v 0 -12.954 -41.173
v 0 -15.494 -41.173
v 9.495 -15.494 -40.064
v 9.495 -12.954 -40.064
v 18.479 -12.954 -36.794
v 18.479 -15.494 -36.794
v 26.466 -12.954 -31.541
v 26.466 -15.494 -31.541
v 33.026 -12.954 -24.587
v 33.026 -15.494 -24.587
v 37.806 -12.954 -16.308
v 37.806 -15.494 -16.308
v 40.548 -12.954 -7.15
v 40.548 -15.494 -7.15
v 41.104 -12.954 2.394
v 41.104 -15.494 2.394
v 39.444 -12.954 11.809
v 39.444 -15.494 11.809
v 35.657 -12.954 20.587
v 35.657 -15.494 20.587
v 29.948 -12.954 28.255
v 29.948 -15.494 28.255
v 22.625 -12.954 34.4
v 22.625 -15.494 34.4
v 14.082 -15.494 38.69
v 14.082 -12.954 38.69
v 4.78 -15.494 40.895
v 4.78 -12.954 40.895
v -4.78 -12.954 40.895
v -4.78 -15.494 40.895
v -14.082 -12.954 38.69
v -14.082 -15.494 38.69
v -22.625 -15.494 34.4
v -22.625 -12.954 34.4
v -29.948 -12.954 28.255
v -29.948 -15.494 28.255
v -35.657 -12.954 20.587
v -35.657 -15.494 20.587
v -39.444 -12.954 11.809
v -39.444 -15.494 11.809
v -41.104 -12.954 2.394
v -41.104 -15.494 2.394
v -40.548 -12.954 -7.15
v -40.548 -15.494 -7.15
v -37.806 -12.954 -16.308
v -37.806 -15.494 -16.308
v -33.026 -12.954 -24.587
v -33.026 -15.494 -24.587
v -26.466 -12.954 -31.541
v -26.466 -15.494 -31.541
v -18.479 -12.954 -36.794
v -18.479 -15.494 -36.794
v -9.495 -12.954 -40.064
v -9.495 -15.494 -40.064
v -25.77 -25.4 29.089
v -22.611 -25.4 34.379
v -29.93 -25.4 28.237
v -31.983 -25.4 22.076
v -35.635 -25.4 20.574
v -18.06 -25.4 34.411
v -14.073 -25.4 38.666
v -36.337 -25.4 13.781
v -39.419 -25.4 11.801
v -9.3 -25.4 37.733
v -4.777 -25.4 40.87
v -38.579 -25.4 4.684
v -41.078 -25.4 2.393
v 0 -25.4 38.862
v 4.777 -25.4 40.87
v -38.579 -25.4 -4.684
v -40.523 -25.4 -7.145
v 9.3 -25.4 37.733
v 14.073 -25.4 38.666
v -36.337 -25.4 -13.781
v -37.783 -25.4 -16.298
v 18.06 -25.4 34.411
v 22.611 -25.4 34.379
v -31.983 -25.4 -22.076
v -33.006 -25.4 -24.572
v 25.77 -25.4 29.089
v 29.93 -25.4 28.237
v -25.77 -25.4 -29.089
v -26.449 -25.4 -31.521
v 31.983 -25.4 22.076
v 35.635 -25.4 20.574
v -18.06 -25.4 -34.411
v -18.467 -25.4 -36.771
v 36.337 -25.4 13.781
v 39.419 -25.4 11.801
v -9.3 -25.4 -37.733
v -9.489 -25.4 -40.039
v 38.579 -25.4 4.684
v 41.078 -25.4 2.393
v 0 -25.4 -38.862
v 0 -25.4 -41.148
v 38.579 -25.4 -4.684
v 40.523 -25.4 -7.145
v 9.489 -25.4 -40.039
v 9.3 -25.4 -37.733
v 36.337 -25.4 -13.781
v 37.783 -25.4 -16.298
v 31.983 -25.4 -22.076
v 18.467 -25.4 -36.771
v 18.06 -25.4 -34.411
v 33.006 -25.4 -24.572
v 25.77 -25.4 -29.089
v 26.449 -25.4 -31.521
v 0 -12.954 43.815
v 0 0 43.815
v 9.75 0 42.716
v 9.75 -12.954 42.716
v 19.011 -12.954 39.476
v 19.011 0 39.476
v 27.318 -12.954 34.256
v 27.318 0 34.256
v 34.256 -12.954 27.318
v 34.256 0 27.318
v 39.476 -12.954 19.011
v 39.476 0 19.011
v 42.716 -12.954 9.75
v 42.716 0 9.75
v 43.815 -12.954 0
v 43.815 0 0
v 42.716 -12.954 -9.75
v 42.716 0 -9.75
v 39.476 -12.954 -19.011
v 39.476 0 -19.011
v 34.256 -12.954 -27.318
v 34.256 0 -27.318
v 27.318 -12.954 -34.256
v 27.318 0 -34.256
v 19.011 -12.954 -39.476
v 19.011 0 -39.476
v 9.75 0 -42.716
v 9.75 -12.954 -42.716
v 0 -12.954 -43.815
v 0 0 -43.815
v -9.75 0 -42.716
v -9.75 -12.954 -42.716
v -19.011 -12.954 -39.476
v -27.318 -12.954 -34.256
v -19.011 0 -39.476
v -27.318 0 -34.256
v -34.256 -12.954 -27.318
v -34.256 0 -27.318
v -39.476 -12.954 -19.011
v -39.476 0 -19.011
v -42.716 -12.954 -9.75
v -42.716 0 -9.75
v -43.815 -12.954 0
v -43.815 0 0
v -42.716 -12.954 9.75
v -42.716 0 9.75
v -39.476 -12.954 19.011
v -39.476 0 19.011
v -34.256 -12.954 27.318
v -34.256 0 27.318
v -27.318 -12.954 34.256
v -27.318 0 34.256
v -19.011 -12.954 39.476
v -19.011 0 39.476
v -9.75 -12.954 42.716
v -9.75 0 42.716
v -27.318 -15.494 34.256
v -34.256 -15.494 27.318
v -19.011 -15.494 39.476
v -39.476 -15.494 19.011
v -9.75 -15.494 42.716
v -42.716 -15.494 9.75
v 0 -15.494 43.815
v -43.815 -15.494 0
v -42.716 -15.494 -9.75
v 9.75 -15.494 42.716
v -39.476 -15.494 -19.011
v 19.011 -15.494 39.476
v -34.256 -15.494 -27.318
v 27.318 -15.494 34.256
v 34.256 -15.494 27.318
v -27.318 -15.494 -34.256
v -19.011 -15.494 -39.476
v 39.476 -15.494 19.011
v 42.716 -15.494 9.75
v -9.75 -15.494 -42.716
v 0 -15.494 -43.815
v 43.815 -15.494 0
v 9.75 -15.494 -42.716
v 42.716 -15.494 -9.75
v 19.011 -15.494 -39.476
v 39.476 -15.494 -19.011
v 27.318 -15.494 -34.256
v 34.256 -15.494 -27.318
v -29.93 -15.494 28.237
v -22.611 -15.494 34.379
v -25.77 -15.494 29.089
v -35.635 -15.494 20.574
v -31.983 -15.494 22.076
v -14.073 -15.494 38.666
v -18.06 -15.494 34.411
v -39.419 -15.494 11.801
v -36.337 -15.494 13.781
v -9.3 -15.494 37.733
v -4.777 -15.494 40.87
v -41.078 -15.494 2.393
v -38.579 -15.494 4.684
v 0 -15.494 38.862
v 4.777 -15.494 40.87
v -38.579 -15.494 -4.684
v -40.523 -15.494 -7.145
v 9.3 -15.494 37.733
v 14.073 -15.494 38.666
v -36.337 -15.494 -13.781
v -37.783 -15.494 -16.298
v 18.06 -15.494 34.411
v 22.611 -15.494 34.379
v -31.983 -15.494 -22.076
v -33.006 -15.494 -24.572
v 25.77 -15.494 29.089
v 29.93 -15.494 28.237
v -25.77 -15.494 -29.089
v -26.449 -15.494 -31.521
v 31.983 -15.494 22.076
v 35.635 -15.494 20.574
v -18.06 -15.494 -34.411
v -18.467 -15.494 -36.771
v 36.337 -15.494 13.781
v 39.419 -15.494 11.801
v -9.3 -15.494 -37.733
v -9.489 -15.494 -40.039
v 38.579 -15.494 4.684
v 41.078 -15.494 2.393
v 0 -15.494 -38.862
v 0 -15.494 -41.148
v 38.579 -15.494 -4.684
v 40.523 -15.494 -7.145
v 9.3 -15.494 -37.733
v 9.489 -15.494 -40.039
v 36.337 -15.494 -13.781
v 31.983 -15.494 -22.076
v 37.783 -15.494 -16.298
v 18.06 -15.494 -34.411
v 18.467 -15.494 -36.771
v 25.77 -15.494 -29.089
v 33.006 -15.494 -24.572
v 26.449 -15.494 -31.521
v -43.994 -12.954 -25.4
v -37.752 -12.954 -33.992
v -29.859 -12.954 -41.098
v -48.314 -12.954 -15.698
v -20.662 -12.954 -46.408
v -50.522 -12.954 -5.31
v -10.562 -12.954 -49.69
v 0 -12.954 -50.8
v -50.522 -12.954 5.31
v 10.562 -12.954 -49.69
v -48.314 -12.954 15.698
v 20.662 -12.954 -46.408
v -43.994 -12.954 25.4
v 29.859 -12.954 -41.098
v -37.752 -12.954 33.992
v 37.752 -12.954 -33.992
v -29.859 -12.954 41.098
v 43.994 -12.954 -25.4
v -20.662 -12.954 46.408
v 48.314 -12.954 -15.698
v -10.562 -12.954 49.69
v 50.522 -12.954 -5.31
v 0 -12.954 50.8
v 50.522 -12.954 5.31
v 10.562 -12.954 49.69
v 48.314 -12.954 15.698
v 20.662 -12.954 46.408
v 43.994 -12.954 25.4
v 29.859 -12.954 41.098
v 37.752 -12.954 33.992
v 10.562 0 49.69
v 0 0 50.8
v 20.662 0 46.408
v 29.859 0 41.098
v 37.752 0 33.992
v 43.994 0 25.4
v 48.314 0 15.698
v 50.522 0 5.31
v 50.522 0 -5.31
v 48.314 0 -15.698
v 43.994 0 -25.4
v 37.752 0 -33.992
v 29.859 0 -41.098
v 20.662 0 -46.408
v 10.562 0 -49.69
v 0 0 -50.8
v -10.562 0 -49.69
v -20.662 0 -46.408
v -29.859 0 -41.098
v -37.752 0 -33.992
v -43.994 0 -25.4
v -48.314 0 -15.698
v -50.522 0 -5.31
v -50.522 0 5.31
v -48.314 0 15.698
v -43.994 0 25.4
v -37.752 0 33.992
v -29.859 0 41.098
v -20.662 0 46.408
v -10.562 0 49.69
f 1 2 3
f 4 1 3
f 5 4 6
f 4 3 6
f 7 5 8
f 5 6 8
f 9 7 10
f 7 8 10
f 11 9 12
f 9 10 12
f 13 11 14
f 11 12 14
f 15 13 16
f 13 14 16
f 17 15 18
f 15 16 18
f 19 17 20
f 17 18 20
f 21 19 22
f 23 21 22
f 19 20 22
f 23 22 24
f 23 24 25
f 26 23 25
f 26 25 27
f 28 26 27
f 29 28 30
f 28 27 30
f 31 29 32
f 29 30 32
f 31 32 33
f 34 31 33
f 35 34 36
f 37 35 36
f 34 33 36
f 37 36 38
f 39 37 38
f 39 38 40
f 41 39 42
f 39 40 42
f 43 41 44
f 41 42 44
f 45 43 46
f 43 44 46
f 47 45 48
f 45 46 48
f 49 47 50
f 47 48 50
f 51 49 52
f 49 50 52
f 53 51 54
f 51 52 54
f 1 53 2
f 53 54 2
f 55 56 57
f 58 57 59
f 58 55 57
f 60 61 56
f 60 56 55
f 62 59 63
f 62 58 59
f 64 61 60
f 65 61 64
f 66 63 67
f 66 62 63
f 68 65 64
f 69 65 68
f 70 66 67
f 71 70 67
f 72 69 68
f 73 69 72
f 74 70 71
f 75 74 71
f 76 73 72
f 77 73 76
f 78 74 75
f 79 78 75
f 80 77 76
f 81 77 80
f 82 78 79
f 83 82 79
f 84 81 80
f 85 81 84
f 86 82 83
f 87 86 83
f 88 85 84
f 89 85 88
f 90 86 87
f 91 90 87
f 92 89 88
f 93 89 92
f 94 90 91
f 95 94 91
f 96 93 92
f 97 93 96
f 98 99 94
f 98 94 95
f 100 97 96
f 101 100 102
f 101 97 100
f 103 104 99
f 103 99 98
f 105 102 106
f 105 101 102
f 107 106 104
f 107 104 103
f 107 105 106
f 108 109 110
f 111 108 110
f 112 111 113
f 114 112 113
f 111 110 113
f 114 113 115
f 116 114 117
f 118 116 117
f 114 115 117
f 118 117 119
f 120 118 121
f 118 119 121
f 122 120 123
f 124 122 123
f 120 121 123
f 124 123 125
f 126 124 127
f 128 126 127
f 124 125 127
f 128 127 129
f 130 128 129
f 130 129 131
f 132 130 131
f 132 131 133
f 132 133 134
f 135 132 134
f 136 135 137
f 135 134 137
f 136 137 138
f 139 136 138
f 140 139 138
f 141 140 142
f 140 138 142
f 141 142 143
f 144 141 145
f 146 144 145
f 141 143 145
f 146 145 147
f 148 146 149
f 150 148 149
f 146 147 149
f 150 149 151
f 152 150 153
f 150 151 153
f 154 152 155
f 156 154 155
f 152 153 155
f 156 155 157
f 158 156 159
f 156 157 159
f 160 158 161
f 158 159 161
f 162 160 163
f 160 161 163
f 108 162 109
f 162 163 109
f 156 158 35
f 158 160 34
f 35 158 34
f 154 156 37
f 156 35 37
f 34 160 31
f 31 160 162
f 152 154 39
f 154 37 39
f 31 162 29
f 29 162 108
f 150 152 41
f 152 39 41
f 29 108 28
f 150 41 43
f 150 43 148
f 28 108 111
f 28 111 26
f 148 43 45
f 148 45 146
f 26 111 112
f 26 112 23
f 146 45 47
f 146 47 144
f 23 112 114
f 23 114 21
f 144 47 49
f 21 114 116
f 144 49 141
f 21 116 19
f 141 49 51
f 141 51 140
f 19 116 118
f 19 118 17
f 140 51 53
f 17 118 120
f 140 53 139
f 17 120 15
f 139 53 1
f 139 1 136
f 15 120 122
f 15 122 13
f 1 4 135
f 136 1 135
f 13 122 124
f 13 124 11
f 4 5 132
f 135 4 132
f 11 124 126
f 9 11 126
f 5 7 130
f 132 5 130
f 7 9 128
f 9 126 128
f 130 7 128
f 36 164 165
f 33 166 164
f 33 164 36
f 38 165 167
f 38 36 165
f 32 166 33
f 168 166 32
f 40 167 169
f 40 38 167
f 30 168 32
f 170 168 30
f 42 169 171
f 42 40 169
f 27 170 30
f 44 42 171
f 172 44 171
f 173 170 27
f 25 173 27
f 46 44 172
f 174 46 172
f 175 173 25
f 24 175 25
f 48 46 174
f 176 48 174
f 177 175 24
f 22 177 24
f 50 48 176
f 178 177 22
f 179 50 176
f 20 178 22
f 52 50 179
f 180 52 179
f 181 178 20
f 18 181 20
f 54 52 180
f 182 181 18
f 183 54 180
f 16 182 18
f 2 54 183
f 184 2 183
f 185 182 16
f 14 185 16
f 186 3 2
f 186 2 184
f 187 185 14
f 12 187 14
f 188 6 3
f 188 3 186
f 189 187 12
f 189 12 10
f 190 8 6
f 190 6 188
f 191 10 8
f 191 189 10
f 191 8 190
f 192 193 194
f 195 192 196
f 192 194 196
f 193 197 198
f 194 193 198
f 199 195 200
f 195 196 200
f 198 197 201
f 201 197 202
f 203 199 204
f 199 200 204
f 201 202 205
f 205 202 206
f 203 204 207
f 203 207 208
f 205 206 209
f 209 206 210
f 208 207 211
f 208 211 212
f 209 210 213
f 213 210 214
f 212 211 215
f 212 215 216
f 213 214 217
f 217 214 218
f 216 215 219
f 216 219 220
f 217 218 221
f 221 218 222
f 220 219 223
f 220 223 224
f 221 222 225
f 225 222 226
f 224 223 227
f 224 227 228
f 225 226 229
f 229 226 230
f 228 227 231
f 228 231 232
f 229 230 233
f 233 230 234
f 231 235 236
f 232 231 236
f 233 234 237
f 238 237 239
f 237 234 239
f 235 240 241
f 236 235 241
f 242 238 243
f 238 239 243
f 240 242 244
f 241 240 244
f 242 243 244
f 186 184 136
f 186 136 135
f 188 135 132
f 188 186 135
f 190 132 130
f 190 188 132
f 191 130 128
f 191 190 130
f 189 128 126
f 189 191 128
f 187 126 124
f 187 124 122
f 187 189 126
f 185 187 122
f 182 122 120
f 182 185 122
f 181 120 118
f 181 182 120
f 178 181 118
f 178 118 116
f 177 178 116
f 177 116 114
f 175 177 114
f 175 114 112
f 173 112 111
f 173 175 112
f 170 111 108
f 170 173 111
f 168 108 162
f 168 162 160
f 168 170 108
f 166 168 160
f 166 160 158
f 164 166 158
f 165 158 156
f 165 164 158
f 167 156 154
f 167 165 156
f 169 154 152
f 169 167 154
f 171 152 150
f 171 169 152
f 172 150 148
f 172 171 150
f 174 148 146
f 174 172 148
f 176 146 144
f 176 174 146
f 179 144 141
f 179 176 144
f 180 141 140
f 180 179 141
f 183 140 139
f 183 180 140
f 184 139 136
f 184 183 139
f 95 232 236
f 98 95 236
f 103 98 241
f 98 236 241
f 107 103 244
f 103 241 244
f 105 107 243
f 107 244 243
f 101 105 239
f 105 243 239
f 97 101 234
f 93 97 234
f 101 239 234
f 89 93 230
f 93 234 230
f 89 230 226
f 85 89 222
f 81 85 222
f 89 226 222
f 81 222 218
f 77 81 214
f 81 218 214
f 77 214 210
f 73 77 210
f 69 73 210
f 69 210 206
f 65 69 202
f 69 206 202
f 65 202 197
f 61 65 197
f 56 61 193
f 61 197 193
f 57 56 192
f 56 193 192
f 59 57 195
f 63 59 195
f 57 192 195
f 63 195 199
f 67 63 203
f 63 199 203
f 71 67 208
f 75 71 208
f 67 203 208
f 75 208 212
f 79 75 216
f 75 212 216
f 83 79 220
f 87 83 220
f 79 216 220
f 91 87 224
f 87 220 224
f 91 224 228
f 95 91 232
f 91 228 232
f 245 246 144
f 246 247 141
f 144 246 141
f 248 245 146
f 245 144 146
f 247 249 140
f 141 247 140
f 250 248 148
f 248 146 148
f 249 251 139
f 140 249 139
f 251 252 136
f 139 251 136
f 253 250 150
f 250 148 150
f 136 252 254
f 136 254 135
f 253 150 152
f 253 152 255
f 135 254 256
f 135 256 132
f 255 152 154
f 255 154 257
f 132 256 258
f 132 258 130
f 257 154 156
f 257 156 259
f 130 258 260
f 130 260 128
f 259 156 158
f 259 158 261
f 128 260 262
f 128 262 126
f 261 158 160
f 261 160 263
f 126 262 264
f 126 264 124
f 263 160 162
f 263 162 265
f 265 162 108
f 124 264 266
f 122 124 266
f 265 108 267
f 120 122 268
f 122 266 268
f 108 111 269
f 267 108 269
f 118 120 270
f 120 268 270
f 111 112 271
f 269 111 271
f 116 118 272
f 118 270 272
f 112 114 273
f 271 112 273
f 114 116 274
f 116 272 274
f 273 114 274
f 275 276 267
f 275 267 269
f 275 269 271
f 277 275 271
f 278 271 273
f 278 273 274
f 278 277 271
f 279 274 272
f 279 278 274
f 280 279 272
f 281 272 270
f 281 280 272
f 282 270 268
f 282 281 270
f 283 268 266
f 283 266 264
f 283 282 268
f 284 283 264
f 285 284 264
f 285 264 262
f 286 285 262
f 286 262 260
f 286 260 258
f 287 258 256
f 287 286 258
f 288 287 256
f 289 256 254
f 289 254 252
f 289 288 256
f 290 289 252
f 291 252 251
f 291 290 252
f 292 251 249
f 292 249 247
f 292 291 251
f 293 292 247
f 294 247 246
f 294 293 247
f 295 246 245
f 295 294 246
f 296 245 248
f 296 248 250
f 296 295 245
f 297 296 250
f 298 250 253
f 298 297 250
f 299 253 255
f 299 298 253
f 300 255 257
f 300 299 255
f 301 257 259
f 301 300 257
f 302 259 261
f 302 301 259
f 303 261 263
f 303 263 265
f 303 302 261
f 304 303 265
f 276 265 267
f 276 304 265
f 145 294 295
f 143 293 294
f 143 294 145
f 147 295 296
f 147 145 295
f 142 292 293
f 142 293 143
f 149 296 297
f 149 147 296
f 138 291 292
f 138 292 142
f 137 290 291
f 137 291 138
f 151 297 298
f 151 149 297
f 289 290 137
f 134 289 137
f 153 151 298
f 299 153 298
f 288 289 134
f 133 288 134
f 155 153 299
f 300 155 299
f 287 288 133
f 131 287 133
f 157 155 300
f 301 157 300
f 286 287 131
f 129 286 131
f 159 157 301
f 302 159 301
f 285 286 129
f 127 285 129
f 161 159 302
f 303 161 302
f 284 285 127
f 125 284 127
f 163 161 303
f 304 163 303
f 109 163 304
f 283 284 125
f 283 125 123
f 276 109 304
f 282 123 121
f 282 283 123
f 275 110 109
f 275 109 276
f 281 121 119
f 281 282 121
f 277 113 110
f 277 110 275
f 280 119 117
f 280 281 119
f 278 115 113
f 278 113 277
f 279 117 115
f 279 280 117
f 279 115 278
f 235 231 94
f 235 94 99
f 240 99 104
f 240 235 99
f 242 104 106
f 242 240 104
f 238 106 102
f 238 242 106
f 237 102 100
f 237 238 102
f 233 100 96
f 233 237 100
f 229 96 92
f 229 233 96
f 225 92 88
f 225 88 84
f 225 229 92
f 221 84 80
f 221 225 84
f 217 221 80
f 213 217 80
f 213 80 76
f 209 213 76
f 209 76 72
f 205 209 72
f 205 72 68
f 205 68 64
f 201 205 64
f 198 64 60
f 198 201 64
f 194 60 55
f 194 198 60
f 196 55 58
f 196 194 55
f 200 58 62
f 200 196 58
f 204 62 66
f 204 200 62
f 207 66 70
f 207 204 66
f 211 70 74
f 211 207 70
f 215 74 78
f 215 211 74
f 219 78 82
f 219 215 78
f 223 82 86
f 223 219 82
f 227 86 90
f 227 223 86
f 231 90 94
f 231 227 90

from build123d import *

# Parameters (mm, degrees)
SKETCH1_R                = 50.8
SKETCH1_R_2              = 43.815
BOSS_EXTRUDE1_DEPTH      = 12.954
SKETCH2_R                = 43.815
SKETCH2_R_2              = 41.1734
BOSS_EXTRUDE2_DEPTH      = 2.54
BOSS_EXTRUDE3_DEPTH      = 7.366
BOSS_EXTRUDE3_DEPTH_BACK = 2.54
SKETCH3_R                = 41.148
SKETCH3_R_2              = 38.862


with BuildPart() as part:
    # Sketch1 → Boss-Extrude1 (new body)
    with BuildSketch(Plane(origin=(0, 0, 0), x_dir=(1, 0, 0), z_dir=(0, 1, 0))):
        with Locations(Location((0, 0, 0), (0, 0, 270))):
            Circle(SKETCH1_R)
        with Locations(Location((0, 0, 0), (0, 0, 270))):
            Circle(SKETCH1_R_2, mode=Mode.SUBTRACT)
    extrude(amount=-BOSS_EXTRUDE1_DEPTH)


with BuildPart() as body_2:
    # Sketch2 → Boss-Extrude2 (new body)
    with BuildSketch(Plane(origin=(0, -15.494, 0), x_dir=(-1, 0, 0), z_dir=(0, -1, 0))):
        with Locations(Location((0, 0, 0), (0, 0, 90))):
            Circle(SKETCH2_R)
        with Locations(Location((0, 0, 0), (0, 0, 90))):
            Circle(SKETCH2_R_2, mode=Mode.SUBTRACT)
    extrude(amount=-BOSS_EXTRUDE2_DEPTH)


with BuildPart() as body_3:
    # Sketch3 → Boss-Extrude3 (new, two sides: drawn at the far end of the back side and taken through both)
    with BuildSketch(Plane(origin=(0, -18.034, 0), x_dir=(-1, 0, 0), z_dir=(0, -1, 0)).offset(-BOSS_EXTRUDE3_DEPTH_BACK)):
        with Locations(Location((0, 0, 0), (0, 0, 90))):
            Circle(SKETCH3_R)
        with Locations(Location((0, 0, 0), (0, 0, 90))):
            Circle(SKETCH3_R_2, mode=Mode.SUBTRACT)
    extrude(amount=BOSS_EXTRUDE3_DEPTH + BOSS_EXTRUDE3_DEPTH_BACK)


solid = Compound([part.part, body_2.part, body_3.part])
